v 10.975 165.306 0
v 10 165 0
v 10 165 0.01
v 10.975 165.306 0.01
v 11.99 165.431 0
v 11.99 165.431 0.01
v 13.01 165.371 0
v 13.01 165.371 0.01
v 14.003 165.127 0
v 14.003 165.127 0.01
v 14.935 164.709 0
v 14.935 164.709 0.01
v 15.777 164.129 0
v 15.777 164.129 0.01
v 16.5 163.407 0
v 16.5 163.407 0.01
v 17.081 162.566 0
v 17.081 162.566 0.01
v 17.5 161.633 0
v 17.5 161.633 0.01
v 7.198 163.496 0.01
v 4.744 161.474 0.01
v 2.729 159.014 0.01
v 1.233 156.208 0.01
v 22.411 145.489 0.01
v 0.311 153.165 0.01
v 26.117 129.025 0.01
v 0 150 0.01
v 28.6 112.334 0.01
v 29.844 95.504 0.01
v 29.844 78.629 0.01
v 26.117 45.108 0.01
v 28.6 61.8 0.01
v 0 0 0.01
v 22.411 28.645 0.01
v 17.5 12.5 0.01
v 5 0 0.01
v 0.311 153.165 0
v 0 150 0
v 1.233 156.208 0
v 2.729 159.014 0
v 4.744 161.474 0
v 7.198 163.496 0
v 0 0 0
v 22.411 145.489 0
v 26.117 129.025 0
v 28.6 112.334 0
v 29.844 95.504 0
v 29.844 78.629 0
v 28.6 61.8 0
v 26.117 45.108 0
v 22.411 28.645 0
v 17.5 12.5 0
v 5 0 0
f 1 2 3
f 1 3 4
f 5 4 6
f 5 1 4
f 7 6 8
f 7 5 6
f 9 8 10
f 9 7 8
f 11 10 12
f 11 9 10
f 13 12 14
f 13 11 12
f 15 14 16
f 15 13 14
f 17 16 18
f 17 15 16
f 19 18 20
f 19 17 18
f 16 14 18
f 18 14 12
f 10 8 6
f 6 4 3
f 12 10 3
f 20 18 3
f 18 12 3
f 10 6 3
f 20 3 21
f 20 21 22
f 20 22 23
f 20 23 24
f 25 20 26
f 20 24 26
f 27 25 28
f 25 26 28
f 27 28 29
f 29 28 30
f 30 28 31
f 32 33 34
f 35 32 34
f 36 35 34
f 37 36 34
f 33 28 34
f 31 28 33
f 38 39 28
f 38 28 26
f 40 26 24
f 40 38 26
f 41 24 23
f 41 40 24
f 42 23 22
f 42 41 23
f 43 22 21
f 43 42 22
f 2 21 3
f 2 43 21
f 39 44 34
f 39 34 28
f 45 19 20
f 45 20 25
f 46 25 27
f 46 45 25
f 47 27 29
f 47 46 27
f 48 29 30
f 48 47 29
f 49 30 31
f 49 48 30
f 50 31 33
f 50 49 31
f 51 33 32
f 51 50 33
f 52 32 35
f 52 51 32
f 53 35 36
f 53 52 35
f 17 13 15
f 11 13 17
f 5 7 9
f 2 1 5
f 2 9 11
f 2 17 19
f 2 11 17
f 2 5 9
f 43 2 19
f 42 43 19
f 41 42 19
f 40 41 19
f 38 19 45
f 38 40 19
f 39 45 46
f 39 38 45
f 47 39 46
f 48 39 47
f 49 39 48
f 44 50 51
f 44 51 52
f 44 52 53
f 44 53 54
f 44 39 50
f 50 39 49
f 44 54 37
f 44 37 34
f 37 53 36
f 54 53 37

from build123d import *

# Parameters (mm, degrees)
BOSS_EXTRUDE1_DEPTH = 0.01


with BuildPart() as part:
    # Sketch1 → Boss-Extrude1 (new body)
    with BuildSketch(Plane(origin=(0, 0, 0), x_dir=(0, 1, 0), z_dir=(0, 0, 1))):
        with BuildLine():
            Line((0, 0), (150, 0))
            ThreePointArc((150, 0), (159.013878189, -2.729182717), (165, -10))
            ThreePointArc((165, -10), (164.939268885, -14.478297905), (161.633492601, -17.5))
            ThreePointArc((161.633492601, -17.5), (87.0667463, -30), (12.5, -17.5))
            Line((12.5, -17.5), (0, -5))
            Line((0, -5), (0, 0))
        make_face()
    extrude(amount=BOSS_EXTRUDE1_DEPTH)


solid = part.part
